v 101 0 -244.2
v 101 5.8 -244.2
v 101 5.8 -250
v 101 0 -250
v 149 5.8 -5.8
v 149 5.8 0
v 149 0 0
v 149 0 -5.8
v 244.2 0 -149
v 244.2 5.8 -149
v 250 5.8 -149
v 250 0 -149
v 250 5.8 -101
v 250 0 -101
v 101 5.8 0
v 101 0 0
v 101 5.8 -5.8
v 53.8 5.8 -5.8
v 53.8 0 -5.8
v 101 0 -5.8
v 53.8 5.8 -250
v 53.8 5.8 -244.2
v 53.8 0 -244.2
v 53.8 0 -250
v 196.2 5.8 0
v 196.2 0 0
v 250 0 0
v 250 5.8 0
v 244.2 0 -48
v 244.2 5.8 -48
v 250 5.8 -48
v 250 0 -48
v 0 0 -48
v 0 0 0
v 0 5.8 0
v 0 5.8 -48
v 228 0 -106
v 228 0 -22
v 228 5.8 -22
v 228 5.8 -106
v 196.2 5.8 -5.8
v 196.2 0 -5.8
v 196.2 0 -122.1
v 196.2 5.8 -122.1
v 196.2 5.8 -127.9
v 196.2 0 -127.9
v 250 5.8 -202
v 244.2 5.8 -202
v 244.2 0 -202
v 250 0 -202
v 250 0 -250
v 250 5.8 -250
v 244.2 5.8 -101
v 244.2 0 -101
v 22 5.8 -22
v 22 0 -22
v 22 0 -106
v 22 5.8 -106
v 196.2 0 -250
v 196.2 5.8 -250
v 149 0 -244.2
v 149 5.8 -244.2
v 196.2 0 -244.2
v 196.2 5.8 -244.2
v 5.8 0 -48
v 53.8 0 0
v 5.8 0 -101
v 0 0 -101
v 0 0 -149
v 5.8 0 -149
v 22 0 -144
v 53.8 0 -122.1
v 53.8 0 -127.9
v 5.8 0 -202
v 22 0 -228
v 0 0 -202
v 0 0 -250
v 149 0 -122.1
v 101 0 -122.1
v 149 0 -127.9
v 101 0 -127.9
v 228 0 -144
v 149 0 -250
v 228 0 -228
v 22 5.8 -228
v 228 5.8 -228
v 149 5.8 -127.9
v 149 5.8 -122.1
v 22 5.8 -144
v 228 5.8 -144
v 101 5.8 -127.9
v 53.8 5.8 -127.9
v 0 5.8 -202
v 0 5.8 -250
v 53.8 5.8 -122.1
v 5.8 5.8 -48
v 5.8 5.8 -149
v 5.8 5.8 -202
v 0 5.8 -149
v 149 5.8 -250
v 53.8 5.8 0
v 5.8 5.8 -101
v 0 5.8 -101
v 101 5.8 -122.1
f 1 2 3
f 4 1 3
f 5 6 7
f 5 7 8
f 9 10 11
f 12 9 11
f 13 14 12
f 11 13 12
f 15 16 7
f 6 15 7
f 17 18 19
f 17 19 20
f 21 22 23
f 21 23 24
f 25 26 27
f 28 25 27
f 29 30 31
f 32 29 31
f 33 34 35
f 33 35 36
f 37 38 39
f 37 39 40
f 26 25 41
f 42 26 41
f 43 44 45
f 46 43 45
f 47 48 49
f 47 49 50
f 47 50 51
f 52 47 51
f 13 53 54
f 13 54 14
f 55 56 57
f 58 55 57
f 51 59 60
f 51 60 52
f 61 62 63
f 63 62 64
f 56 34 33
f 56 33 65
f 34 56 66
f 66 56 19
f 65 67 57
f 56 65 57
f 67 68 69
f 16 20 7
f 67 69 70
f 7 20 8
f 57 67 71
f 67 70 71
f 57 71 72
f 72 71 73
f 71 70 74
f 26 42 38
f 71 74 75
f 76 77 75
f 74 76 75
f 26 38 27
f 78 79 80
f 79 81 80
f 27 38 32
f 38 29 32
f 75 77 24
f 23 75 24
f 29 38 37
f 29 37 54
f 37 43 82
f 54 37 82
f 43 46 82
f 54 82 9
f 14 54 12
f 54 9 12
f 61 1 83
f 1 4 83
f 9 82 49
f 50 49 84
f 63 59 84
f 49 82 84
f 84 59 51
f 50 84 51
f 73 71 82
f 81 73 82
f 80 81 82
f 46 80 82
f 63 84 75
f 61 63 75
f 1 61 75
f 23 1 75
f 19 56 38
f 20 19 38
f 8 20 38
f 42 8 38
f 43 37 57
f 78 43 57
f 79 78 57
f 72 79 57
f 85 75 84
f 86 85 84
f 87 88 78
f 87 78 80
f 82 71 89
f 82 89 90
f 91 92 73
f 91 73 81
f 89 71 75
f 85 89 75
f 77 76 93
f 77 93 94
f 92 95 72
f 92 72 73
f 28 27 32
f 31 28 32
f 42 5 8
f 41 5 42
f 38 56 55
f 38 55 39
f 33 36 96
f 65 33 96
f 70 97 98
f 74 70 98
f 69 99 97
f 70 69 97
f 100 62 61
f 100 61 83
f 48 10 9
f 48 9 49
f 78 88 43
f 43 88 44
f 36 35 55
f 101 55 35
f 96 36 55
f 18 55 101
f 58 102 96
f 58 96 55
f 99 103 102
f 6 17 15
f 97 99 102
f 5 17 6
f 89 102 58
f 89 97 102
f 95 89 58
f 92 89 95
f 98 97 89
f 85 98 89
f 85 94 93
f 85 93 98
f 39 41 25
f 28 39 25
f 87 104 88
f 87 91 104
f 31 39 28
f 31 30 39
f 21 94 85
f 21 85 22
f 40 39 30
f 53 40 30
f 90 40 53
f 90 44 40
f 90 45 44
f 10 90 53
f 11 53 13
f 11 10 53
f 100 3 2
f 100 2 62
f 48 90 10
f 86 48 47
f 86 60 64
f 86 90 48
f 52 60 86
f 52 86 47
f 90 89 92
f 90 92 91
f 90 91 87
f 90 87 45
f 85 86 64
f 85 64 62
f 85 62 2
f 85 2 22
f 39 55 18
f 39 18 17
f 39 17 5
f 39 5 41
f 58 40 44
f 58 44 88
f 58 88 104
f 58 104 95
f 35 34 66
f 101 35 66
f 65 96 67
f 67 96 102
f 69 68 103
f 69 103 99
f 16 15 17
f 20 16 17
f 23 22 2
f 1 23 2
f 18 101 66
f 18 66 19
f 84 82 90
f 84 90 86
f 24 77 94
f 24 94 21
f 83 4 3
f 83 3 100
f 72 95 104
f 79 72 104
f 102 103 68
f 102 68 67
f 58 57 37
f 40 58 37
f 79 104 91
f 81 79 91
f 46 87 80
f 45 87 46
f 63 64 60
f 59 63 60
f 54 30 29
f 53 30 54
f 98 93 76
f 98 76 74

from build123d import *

# Parameters (mm, degrees)
SKETCH_1_W          = 250
SKETCH_1_H          = 250
SKETCH_1_W_2        = 206
SKETCH_1_H_2        = 84
EXTRUDE_1_DEPTH     = 5.8
CUT_EXTRUDE_1_REACH = 355.601
SKETCH_2_W          = 47.2
SKETCH_2_H          = 5.8
SKETCH_2_W_2        = 5.8
SKETCH_2_H_2        = 53


with BuildPart() as part:
    # Эскиз1 → Бобышка-Вытянуть1 (new body)
    with BuildSketch(Plane(origin=(0, 0, 0), x_dir=(1, 0, 0), z_dir=(0, 1, 0))):
        with Locations((125, 125)):
            Rectangle(SKETCH_1_W, SKETCH_1_H)
        with Locations((125, 186)):
            Rectangle(SKETCH_1_W_2, SKETCH_1_H_2, mode=Mode.SUBTRACT)
        with Locations((125, 64)):
            Rectangle(SKETCH_1_W_2, SKETCH_1_H_2, mode=Mode.SUBTRACT)
    extrude(amount=EXTRUDE_1_DEPTH)

    # Эскиз2 → Вырез-Вытянуть1 (cut, up to next)
    with BuildSketch(Plane(origin=(0, 5.8, 0), x_dir=(1, 0, 0), z_dir=(0, 1, 0)), mode=Mode.PRIVATE) as cut_extrude_1_sk1:
        with Locations((77.4, 2.9)):
            Rectangle(SKETCH_2_W, SKETCH_2_H)
    cut_extrude_1_tool1 = extrude(cut_extrude_1_sk1.sketch, amount=-CUT_EXTRUDE_1_REACH, mode=Mode.PRIVATE) & part.part
    # Эскиз2 → Вырез-Вытянуть1 (cut, up to next)
    with BuildSketch(Plane(origin=(0, 5.8, 0), x_dir=(1, 0, 0), z_dir=(0, 1, 0)), mode=Mode.PRIVATE) as cut_extrude_1_sk2:
        with Locations((77.4, 125)):
            Rectangle(SKETCH_2_W, SKETCH_2_H)
    cut_extrude_1_tool2 = extrude(cut_extrude_1_sk2.sketch, amount=-CUT_EXTRUDE_1_REACH, mode=Mode.PRIVATE) & part.part
    # Эскиз2 → Вырез-Вытянуть1 (cut, up to next)
    with BuildSketch(Plane(origin=(0, 5.8, 0), x_dir=(1, 0, 0), z_dir=(0, 1, 0)), mode=Mode.PRIVATE) as cut_extrude_1_sk3:
        with Locations((77.4, 247.1)):
            Rectangle(SKETCH_2_W, SKETCH_2_H)
    cut_extrude_1_tool3 = extrude(cut_extrude_1_sk3.sketch, amount=-CUT_EXTRUDE_1_REACH, mode=Mode.PRIVATE) & part.part
    # Эскиз2 → Вырез-Вытянуть1 (cut, up to next)
    with BuildSketch(Plane(origin=(0, 5.8, 0), x_dir=(1, 0, 0), z_dir=(0, 1, 0)), mode=Mode.PRIVATE) as cut_extrude_1_sk4:
        with Locations((2.9, 175.5)):
            Rectangle(SKETCH_2_W_2, SKETCH_2_H_2)
    cut_extrude_1_tool4 = extrude(cut_extrude_1_sk4.sketch, amount=-CUT_EXTRUDE_1_REACH, mode=Mode.PRIVATE) & part.part
    # Эскиз2 → Вырез-Вытянуть1 (cut, up to next)
    with BuildSketch(Plane(origin=(0, 5.8, 0), x_dir=(1, 0, 0), z_dir=(0, 1, 0)), mode=Mode.PRIVATE) as cut_extrude_1_sk5:
        with Locations((2.9, 74.5)):
            Rectangle(SKETCH_2_W_2, SKETCH_2_H_2)
    cut_extrude_1_tool5 = extrude(cut_extrude_1_sk5.sketch, amount=-CUT_EXTRUDE_1_REACH, mode=Mode.PRIVATE) & part.part
    # Эскиз2 → Вырез-Вытянуть1 (cut, up to next)
    with BuildSketch(Plane(origin=(0, 5.8, 0), x_dir=(1, 0, 0), z_dir=(0, 1, 0)), mode=Mode.PRIVATE) as cut_extrude_1_sk6:
        with Locations((172.6, 2.9)):
            Rectangle(SKETCH_2_W, SKETCH_2_H)
    cut_extrude_1_tool6 = extrude(cut_extrude_1_sk6.sketch, amount=-CUT_EXTRUDE_1_REACH, mode=Mode.PRIVATE) & part.part
    # Эскиз2 → Вырез-Вытянуть1 (cut, up to next)
    with BuildSketch(Plane(origin=(0, 5.8, 0), x_dir=(1, 0, 0), z_dir=(0, 1, 0)), mode=Mode.PRIVATE) as cut_extrude_1_sk7:
        with Locations((172.6, 125)):
            Rectangle(SKETCH_2_W, SKETCH_2_H)
    cut_extrude_1_tool7 = extrude(cut_extrude_1_sk7.sketch, amount=-CUT_EXTRUDE_1_REACH, mode=Mode.PRIVATE) & part.part
    # Эскиз2 → Вырез-Вытянуть1 (cut, up to next)
    with BuildSketch(Plane(origin=(0, 5.8, 0), x_dir=(1, 0, 0), z_dir=(0, 1, 0)), mode=Mode.PRIVATE) as cut_extrude_1_sk8:
        with Locations((172.6, 247.1)):
            Rectangle(SKETCH_2_W, SKETCH_2_H)
    cut_extrude_1_tool8 = extrude(cut_extrude_1_sk8.sketch, amount=-CUT_EXTRUDE_1_REACH, mode=Mode.PRIVATE) & part.part
    # Эскиз2 → Вырез-Вытянуть1 (cut, up to next)
    with BuildSketch(Plane(origin=(0, 5.8, 0), x_dir=(1, 0, 0), z_dir=(0, 1, 0)), mode=Mode.PRIVATE) as cut_extrude_1_sk9:
        with Locations((247.1, 175.5)):
            Rectangle(SKETCH_2_W_2, SKETCH_2_H_2)
    cut_extrude_1_tool9 = extrude(cut_extrude_1_sk9.sketch, amount=-CUT_EXTRUDE_1_REACH, mode=Mode.PRIVATE) & part.part
    # Эскиз2 → Вырез-Вытянуть1 (cut, up to next)
    with BuildSketch(Plane(origin=(0, 5.8, 0), x_dir=(1, 0, 0), z_dir=(0, 1, 0)), mode=Mode.PRIVATE) as cut_extrude_1_sk10:
        with Locations((247.1, 74.5)):
            Rectangle(SKETCH_2_W_2, SKETCH_2_H_2)
    cut_extrude_1_tool10 = extrude(cut_extrude_1_sk10.sketch, amount=-CUT_EXTRUDE_1_REACH, mode=Mode.PRIVATE) & part.part
    add(cut_extrude_1_tool1.solids().sort_by_distance((77.4, 5.8, -2.9))[0], mode=Mode.SUBTRACT)
    add(cut_extrude_1_tool2.solids().sort_by_distance((77.4, 5.8, -125))[0], mode=Mode.SUBTRACT)
    add(cut_extrude_1_tool3.solids().sort_by_distance((77.4, 5.8, -247.1))[0], mode=Mode.SUBTRACT)
    add(cut_extrude_1_tool4.solids().sort_by_distance((2.9, 5.8, -175.5))[0], mode=Mode.SUBTRACT)
    add(cut_extrude_1_tool5.solids().sort_by_distance((2.9, 5.8, -74.5))[0], mode=Mode.SUBTRACT)
    add(cut_extrude_1_tool6.solids().sort_by_distance((172.6, 5.8, -2.9))[0], mode=Mode.SUBTRACT)
    add(cut_extrude_1_tool7.solids().sort_by_distance((172.6, 5.8, -125))[0], mode=Mode.SUBTRACT)
    add(cut_extrude_1_tool8.solids().sort_by_distance((172.6, 5.8, -247.1))[0], mode=Mode.SUBTRACT)
    add(cut_extrude_1_tool9.solids().sort_by_distance((247.1, 5.8, -175.5))[0], mode=Mode.SUBTRACT)
    add(cut_extrude_1_tool10.solids().sort_by_distance((247.1, 5.8, -74.5))[0], mode=Mode.SUBTRACT)


solid = part.part
